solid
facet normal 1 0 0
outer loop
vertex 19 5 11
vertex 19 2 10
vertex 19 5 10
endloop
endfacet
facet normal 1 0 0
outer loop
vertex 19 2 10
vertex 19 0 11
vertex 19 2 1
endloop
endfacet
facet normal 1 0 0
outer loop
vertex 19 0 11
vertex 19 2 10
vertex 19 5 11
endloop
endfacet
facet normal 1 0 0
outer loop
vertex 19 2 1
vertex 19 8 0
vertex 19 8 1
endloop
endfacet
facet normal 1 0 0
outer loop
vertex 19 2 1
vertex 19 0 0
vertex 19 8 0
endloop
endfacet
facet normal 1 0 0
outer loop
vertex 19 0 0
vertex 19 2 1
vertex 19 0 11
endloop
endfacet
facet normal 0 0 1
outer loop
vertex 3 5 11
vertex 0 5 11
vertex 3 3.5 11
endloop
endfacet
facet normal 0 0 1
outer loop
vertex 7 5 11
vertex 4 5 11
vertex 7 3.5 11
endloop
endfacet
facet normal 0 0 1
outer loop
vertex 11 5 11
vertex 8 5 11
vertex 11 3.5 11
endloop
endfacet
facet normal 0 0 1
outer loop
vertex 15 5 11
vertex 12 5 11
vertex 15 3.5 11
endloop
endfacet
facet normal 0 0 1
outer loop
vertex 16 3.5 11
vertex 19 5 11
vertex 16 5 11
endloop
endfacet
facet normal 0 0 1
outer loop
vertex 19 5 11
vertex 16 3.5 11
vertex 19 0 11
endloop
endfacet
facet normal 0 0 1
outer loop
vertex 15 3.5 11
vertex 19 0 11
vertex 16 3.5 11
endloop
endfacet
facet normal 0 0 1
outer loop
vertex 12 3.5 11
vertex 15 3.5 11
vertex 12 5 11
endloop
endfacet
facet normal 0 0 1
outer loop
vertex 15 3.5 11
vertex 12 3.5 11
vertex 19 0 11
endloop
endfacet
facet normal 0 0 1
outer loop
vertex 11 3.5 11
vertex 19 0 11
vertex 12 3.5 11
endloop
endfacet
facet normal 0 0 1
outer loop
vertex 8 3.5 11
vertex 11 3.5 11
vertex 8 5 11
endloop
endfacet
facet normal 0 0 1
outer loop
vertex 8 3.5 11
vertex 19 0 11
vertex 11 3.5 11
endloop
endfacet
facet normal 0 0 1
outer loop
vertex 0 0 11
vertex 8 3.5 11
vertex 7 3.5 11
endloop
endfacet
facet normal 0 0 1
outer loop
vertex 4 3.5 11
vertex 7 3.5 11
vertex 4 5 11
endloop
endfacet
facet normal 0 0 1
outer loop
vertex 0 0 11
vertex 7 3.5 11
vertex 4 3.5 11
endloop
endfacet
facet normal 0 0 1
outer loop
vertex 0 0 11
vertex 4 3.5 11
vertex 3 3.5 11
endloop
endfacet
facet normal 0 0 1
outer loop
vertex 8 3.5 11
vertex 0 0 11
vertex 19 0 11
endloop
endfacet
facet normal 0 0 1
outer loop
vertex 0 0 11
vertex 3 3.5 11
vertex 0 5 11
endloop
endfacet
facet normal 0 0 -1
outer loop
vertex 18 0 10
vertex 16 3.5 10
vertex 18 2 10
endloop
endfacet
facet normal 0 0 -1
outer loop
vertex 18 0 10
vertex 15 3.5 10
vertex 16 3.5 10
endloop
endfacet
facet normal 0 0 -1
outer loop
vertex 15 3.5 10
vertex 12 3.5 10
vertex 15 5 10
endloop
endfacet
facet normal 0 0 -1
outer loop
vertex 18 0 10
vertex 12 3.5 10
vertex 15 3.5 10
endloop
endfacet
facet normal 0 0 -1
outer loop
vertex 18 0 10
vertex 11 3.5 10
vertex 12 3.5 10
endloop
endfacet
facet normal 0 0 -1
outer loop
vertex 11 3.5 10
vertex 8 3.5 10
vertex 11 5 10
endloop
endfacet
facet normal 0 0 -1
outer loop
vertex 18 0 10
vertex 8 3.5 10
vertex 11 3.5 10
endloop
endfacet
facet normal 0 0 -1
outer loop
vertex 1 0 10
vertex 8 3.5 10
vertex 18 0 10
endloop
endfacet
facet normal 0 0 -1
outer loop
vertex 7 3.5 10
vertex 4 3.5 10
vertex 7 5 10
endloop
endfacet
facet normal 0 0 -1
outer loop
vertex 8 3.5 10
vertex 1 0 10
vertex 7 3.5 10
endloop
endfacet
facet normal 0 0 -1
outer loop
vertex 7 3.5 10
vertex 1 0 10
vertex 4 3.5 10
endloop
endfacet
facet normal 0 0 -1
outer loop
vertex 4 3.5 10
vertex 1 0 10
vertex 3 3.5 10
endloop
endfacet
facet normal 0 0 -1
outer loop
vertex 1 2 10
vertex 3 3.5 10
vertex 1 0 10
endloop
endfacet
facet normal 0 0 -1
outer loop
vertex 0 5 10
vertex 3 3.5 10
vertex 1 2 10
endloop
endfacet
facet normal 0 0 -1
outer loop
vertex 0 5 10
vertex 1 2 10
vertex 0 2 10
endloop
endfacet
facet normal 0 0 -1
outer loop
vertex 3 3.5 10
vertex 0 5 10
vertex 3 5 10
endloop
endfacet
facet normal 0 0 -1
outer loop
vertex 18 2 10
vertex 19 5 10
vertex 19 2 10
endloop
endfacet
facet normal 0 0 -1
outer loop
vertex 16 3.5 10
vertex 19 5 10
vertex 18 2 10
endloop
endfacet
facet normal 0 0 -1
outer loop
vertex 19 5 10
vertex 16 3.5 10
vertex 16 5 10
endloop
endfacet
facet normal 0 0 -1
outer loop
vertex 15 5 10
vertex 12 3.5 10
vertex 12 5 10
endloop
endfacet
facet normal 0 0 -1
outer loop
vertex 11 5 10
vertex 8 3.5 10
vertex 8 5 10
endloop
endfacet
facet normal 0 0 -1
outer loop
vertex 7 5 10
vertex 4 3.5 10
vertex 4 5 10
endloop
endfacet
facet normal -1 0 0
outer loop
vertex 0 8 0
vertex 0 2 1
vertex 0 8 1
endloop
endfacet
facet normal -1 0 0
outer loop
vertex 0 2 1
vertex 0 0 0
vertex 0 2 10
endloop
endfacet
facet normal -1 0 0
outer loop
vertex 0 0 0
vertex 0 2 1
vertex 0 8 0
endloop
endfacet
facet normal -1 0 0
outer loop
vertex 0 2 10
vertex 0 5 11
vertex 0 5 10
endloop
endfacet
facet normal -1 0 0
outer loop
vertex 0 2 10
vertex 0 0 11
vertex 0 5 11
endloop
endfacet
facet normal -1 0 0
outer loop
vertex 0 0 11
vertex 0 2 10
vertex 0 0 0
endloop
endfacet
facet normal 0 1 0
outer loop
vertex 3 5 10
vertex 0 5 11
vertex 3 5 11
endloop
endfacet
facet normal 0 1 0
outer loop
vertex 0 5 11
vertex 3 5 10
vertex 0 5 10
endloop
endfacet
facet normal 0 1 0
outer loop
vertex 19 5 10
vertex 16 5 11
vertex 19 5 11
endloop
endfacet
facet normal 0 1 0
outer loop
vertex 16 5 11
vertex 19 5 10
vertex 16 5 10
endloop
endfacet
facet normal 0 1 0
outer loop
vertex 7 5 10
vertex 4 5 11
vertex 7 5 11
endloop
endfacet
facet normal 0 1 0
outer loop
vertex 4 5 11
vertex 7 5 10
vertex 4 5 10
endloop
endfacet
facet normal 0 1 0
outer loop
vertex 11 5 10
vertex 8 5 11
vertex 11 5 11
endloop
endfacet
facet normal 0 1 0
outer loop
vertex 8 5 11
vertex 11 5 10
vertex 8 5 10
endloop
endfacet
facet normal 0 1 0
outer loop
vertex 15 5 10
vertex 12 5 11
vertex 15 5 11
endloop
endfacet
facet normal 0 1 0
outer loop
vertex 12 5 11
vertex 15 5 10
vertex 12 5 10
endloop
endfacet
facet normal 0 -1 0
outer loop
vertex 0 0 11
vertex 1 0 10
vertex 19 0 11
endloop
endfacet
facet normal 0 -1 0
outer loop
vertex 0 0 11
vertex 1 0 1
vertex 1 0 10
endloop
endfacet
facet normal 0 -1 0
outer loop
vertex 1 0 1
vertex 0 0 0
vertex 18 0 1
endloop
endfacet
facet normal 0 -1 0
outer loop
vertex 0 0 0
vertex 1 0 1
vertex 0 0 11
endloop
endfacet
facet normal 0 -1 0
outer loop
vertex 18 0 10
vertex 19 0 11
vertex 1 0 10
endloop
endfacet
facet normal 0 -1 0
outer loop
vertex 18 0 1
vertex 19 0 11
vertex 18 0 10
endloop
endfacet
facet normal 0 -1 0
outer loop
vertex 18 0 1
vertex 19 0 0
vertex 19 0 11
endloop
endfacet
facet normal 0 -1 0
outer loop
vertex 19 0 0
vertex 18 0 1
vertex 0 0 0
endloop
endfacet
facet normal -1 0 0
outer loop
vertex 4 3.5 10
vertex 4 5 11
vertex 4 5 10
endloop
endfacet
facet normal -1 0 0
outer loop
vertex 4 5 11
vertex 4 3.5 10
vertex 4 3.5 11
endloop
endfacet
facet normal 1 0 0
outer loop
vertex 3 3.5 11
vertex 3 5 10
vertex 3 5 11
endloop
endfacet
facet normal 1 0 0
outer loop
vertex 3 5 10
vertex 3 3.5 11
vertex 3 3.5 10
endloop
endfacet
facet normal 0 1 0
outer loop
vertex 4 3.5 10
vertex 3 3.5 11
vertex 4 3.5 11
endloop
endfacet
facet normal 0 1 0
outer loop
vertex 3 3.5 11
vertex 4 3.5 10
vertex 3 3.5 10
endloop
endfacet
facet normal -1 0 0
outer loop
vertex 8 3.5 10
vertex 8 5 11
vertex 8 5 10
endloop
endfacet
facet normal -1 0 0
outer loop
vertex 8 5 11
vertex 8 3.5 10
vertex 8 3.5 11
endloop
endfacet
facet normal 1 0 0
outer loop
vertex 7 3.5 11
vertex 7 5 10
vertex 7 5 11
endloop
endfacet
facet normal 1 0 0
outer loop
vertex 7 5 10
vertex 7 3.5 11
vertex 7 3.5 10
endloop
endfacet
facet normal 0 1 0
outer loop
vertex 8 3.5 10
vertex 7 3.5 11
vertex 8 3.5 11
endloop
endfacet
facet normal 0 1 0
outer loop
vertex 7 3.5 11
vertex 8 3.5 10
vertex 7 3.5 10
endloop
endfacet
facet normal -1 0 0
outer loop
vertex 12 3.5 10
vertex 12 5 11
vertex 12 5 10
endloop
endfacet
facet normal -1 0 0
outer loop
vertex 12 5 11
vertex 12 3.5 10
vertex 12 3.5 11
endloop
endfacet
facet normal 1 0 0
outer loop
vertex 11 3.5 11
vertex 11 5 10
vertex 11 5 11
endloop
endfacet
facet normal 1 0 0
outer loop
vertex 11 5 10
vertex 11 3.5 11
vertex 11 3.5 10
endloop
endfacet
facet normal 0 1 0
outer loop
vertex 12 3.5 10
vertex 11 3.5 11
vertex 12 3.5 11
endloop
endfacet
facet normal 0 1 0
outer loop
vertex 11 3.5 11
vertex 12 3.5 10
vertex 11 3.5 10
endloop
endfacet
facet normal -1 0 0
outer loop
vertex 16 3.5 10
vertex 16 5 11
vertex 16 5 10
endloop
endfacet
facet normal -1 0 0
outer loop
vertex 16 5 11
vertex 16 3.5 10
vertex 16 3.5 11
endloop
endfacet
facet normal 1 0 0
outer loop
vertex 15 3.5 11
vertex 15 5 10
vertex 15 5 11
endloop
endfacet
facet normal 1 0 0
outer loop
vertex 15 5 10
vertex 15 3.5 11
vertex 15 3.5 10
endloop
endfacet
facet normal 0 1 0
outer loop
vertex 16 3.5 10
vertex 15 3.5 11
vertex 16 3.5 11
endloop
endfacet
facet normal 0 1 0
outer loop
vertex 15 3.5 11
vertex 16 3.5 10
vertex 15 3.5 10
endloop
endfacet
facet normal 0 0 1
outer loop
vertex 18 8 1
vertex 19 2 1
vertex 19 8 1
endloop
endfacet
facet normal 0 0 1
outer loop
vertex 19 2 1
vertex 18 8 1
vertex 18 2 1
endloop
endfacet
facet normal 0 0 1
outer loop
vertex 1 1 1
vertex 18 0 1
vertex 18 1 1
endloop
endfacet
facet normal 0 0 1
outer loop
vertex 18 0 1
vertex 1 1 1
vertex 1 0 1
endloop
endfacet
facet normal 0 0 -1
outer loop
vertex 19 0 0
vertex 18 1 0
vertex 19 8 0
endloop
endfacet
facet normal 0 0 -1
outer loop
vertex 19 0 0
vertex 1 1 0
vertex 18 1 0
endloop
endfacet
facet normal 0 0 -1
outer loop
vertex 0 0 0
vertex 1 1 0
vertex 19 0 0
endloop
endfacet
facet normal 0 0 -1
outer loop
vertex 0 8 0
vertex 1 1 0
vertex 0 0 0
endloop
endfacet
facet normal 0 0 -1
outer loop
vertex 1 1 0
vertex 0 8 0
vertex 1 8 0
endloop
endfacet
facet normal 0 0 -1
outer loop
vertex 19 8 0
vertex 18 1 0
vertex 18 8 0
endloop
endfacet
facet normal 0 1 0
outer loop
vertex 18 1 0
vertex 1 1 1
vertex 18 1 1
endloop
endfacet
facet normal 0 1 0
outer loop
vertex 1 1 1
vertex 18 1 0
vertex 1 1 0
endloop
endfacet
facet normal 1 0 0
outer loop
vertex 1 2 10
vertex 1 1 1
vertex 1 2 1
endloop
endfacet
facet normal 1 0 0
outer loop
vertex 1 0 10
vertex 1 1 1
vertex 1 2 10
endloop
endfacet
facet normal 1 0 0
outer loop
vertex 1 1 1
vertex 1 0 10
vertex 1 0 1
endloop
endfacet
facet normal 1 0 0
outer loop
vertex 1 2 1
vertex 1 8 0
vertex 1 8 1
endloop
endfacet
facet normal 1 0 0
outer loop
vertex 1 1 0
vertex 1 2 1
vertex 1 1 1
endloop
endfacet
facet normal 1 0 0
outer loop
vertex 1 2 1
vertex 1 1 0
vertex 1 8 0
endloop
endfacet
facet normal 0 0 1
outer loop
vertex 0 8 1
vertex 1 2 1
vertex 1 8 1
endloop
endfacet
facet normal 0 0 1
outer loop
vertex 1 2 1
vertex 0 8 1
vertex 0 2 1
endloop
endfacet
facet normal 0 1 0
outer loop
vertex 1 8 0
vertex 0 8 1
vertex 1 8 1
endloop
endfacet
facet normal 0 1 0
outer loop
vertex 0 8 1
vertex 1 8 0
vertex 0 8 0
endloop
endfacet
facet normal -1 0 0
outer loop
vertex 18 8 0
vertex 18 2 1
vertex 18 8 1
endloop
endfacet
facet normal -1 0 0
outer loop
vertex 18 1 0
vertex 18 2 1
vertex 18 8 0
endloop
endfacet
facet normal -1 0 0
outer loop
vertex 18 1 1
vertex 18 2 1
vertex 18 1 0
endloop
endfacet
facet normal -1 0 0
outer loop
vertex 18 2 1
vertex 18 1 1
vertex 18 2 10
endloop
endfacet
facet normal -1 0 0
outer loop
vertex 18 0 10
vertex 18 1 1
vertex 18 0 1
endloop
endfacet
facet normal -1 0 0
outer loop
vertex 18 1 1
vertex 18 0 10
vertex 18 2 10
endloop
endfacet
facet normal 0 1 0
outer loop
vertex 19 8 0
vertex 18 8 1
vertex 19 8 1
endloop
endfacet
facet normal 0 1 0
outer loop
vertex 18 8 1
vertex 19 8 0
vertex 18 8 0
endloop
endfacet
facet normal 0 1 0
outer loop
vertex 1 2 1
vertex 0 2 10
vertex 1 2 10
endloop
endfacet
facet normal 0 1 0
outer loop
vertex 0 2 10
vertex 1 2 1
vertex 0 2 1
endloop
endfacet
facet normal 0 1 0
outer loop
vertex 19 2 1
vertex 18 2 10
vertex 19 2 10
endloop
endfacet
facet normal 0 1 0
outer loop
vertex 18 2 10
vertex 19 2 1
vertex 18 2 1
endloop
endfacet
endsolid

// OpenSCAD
// Copyright © 2014 Martin Ueding <dev@martin-ueding.de>

// Back side.
cube([19,1,1]);

// Feet.
cube([1,8,1]);
translate([18,0,0]) cube([1,8,1]);

// Pillars.
cube([1,2,10]);
translate([18,0,0]) cube([1,2,10]);

// Top plate.
translate([0,0,10]) difference() {
	cube([19,5,1]);
	translate([3,3.5,0]) cube([1,1.5,1]);
	translate([7,3.5,0]) cube([1,1.5,1]);
	translate([11,3.5,0]) cube([1,1.5,1]);
	translate([15,3.5,0]) cube([1,1.5,1]);
}
